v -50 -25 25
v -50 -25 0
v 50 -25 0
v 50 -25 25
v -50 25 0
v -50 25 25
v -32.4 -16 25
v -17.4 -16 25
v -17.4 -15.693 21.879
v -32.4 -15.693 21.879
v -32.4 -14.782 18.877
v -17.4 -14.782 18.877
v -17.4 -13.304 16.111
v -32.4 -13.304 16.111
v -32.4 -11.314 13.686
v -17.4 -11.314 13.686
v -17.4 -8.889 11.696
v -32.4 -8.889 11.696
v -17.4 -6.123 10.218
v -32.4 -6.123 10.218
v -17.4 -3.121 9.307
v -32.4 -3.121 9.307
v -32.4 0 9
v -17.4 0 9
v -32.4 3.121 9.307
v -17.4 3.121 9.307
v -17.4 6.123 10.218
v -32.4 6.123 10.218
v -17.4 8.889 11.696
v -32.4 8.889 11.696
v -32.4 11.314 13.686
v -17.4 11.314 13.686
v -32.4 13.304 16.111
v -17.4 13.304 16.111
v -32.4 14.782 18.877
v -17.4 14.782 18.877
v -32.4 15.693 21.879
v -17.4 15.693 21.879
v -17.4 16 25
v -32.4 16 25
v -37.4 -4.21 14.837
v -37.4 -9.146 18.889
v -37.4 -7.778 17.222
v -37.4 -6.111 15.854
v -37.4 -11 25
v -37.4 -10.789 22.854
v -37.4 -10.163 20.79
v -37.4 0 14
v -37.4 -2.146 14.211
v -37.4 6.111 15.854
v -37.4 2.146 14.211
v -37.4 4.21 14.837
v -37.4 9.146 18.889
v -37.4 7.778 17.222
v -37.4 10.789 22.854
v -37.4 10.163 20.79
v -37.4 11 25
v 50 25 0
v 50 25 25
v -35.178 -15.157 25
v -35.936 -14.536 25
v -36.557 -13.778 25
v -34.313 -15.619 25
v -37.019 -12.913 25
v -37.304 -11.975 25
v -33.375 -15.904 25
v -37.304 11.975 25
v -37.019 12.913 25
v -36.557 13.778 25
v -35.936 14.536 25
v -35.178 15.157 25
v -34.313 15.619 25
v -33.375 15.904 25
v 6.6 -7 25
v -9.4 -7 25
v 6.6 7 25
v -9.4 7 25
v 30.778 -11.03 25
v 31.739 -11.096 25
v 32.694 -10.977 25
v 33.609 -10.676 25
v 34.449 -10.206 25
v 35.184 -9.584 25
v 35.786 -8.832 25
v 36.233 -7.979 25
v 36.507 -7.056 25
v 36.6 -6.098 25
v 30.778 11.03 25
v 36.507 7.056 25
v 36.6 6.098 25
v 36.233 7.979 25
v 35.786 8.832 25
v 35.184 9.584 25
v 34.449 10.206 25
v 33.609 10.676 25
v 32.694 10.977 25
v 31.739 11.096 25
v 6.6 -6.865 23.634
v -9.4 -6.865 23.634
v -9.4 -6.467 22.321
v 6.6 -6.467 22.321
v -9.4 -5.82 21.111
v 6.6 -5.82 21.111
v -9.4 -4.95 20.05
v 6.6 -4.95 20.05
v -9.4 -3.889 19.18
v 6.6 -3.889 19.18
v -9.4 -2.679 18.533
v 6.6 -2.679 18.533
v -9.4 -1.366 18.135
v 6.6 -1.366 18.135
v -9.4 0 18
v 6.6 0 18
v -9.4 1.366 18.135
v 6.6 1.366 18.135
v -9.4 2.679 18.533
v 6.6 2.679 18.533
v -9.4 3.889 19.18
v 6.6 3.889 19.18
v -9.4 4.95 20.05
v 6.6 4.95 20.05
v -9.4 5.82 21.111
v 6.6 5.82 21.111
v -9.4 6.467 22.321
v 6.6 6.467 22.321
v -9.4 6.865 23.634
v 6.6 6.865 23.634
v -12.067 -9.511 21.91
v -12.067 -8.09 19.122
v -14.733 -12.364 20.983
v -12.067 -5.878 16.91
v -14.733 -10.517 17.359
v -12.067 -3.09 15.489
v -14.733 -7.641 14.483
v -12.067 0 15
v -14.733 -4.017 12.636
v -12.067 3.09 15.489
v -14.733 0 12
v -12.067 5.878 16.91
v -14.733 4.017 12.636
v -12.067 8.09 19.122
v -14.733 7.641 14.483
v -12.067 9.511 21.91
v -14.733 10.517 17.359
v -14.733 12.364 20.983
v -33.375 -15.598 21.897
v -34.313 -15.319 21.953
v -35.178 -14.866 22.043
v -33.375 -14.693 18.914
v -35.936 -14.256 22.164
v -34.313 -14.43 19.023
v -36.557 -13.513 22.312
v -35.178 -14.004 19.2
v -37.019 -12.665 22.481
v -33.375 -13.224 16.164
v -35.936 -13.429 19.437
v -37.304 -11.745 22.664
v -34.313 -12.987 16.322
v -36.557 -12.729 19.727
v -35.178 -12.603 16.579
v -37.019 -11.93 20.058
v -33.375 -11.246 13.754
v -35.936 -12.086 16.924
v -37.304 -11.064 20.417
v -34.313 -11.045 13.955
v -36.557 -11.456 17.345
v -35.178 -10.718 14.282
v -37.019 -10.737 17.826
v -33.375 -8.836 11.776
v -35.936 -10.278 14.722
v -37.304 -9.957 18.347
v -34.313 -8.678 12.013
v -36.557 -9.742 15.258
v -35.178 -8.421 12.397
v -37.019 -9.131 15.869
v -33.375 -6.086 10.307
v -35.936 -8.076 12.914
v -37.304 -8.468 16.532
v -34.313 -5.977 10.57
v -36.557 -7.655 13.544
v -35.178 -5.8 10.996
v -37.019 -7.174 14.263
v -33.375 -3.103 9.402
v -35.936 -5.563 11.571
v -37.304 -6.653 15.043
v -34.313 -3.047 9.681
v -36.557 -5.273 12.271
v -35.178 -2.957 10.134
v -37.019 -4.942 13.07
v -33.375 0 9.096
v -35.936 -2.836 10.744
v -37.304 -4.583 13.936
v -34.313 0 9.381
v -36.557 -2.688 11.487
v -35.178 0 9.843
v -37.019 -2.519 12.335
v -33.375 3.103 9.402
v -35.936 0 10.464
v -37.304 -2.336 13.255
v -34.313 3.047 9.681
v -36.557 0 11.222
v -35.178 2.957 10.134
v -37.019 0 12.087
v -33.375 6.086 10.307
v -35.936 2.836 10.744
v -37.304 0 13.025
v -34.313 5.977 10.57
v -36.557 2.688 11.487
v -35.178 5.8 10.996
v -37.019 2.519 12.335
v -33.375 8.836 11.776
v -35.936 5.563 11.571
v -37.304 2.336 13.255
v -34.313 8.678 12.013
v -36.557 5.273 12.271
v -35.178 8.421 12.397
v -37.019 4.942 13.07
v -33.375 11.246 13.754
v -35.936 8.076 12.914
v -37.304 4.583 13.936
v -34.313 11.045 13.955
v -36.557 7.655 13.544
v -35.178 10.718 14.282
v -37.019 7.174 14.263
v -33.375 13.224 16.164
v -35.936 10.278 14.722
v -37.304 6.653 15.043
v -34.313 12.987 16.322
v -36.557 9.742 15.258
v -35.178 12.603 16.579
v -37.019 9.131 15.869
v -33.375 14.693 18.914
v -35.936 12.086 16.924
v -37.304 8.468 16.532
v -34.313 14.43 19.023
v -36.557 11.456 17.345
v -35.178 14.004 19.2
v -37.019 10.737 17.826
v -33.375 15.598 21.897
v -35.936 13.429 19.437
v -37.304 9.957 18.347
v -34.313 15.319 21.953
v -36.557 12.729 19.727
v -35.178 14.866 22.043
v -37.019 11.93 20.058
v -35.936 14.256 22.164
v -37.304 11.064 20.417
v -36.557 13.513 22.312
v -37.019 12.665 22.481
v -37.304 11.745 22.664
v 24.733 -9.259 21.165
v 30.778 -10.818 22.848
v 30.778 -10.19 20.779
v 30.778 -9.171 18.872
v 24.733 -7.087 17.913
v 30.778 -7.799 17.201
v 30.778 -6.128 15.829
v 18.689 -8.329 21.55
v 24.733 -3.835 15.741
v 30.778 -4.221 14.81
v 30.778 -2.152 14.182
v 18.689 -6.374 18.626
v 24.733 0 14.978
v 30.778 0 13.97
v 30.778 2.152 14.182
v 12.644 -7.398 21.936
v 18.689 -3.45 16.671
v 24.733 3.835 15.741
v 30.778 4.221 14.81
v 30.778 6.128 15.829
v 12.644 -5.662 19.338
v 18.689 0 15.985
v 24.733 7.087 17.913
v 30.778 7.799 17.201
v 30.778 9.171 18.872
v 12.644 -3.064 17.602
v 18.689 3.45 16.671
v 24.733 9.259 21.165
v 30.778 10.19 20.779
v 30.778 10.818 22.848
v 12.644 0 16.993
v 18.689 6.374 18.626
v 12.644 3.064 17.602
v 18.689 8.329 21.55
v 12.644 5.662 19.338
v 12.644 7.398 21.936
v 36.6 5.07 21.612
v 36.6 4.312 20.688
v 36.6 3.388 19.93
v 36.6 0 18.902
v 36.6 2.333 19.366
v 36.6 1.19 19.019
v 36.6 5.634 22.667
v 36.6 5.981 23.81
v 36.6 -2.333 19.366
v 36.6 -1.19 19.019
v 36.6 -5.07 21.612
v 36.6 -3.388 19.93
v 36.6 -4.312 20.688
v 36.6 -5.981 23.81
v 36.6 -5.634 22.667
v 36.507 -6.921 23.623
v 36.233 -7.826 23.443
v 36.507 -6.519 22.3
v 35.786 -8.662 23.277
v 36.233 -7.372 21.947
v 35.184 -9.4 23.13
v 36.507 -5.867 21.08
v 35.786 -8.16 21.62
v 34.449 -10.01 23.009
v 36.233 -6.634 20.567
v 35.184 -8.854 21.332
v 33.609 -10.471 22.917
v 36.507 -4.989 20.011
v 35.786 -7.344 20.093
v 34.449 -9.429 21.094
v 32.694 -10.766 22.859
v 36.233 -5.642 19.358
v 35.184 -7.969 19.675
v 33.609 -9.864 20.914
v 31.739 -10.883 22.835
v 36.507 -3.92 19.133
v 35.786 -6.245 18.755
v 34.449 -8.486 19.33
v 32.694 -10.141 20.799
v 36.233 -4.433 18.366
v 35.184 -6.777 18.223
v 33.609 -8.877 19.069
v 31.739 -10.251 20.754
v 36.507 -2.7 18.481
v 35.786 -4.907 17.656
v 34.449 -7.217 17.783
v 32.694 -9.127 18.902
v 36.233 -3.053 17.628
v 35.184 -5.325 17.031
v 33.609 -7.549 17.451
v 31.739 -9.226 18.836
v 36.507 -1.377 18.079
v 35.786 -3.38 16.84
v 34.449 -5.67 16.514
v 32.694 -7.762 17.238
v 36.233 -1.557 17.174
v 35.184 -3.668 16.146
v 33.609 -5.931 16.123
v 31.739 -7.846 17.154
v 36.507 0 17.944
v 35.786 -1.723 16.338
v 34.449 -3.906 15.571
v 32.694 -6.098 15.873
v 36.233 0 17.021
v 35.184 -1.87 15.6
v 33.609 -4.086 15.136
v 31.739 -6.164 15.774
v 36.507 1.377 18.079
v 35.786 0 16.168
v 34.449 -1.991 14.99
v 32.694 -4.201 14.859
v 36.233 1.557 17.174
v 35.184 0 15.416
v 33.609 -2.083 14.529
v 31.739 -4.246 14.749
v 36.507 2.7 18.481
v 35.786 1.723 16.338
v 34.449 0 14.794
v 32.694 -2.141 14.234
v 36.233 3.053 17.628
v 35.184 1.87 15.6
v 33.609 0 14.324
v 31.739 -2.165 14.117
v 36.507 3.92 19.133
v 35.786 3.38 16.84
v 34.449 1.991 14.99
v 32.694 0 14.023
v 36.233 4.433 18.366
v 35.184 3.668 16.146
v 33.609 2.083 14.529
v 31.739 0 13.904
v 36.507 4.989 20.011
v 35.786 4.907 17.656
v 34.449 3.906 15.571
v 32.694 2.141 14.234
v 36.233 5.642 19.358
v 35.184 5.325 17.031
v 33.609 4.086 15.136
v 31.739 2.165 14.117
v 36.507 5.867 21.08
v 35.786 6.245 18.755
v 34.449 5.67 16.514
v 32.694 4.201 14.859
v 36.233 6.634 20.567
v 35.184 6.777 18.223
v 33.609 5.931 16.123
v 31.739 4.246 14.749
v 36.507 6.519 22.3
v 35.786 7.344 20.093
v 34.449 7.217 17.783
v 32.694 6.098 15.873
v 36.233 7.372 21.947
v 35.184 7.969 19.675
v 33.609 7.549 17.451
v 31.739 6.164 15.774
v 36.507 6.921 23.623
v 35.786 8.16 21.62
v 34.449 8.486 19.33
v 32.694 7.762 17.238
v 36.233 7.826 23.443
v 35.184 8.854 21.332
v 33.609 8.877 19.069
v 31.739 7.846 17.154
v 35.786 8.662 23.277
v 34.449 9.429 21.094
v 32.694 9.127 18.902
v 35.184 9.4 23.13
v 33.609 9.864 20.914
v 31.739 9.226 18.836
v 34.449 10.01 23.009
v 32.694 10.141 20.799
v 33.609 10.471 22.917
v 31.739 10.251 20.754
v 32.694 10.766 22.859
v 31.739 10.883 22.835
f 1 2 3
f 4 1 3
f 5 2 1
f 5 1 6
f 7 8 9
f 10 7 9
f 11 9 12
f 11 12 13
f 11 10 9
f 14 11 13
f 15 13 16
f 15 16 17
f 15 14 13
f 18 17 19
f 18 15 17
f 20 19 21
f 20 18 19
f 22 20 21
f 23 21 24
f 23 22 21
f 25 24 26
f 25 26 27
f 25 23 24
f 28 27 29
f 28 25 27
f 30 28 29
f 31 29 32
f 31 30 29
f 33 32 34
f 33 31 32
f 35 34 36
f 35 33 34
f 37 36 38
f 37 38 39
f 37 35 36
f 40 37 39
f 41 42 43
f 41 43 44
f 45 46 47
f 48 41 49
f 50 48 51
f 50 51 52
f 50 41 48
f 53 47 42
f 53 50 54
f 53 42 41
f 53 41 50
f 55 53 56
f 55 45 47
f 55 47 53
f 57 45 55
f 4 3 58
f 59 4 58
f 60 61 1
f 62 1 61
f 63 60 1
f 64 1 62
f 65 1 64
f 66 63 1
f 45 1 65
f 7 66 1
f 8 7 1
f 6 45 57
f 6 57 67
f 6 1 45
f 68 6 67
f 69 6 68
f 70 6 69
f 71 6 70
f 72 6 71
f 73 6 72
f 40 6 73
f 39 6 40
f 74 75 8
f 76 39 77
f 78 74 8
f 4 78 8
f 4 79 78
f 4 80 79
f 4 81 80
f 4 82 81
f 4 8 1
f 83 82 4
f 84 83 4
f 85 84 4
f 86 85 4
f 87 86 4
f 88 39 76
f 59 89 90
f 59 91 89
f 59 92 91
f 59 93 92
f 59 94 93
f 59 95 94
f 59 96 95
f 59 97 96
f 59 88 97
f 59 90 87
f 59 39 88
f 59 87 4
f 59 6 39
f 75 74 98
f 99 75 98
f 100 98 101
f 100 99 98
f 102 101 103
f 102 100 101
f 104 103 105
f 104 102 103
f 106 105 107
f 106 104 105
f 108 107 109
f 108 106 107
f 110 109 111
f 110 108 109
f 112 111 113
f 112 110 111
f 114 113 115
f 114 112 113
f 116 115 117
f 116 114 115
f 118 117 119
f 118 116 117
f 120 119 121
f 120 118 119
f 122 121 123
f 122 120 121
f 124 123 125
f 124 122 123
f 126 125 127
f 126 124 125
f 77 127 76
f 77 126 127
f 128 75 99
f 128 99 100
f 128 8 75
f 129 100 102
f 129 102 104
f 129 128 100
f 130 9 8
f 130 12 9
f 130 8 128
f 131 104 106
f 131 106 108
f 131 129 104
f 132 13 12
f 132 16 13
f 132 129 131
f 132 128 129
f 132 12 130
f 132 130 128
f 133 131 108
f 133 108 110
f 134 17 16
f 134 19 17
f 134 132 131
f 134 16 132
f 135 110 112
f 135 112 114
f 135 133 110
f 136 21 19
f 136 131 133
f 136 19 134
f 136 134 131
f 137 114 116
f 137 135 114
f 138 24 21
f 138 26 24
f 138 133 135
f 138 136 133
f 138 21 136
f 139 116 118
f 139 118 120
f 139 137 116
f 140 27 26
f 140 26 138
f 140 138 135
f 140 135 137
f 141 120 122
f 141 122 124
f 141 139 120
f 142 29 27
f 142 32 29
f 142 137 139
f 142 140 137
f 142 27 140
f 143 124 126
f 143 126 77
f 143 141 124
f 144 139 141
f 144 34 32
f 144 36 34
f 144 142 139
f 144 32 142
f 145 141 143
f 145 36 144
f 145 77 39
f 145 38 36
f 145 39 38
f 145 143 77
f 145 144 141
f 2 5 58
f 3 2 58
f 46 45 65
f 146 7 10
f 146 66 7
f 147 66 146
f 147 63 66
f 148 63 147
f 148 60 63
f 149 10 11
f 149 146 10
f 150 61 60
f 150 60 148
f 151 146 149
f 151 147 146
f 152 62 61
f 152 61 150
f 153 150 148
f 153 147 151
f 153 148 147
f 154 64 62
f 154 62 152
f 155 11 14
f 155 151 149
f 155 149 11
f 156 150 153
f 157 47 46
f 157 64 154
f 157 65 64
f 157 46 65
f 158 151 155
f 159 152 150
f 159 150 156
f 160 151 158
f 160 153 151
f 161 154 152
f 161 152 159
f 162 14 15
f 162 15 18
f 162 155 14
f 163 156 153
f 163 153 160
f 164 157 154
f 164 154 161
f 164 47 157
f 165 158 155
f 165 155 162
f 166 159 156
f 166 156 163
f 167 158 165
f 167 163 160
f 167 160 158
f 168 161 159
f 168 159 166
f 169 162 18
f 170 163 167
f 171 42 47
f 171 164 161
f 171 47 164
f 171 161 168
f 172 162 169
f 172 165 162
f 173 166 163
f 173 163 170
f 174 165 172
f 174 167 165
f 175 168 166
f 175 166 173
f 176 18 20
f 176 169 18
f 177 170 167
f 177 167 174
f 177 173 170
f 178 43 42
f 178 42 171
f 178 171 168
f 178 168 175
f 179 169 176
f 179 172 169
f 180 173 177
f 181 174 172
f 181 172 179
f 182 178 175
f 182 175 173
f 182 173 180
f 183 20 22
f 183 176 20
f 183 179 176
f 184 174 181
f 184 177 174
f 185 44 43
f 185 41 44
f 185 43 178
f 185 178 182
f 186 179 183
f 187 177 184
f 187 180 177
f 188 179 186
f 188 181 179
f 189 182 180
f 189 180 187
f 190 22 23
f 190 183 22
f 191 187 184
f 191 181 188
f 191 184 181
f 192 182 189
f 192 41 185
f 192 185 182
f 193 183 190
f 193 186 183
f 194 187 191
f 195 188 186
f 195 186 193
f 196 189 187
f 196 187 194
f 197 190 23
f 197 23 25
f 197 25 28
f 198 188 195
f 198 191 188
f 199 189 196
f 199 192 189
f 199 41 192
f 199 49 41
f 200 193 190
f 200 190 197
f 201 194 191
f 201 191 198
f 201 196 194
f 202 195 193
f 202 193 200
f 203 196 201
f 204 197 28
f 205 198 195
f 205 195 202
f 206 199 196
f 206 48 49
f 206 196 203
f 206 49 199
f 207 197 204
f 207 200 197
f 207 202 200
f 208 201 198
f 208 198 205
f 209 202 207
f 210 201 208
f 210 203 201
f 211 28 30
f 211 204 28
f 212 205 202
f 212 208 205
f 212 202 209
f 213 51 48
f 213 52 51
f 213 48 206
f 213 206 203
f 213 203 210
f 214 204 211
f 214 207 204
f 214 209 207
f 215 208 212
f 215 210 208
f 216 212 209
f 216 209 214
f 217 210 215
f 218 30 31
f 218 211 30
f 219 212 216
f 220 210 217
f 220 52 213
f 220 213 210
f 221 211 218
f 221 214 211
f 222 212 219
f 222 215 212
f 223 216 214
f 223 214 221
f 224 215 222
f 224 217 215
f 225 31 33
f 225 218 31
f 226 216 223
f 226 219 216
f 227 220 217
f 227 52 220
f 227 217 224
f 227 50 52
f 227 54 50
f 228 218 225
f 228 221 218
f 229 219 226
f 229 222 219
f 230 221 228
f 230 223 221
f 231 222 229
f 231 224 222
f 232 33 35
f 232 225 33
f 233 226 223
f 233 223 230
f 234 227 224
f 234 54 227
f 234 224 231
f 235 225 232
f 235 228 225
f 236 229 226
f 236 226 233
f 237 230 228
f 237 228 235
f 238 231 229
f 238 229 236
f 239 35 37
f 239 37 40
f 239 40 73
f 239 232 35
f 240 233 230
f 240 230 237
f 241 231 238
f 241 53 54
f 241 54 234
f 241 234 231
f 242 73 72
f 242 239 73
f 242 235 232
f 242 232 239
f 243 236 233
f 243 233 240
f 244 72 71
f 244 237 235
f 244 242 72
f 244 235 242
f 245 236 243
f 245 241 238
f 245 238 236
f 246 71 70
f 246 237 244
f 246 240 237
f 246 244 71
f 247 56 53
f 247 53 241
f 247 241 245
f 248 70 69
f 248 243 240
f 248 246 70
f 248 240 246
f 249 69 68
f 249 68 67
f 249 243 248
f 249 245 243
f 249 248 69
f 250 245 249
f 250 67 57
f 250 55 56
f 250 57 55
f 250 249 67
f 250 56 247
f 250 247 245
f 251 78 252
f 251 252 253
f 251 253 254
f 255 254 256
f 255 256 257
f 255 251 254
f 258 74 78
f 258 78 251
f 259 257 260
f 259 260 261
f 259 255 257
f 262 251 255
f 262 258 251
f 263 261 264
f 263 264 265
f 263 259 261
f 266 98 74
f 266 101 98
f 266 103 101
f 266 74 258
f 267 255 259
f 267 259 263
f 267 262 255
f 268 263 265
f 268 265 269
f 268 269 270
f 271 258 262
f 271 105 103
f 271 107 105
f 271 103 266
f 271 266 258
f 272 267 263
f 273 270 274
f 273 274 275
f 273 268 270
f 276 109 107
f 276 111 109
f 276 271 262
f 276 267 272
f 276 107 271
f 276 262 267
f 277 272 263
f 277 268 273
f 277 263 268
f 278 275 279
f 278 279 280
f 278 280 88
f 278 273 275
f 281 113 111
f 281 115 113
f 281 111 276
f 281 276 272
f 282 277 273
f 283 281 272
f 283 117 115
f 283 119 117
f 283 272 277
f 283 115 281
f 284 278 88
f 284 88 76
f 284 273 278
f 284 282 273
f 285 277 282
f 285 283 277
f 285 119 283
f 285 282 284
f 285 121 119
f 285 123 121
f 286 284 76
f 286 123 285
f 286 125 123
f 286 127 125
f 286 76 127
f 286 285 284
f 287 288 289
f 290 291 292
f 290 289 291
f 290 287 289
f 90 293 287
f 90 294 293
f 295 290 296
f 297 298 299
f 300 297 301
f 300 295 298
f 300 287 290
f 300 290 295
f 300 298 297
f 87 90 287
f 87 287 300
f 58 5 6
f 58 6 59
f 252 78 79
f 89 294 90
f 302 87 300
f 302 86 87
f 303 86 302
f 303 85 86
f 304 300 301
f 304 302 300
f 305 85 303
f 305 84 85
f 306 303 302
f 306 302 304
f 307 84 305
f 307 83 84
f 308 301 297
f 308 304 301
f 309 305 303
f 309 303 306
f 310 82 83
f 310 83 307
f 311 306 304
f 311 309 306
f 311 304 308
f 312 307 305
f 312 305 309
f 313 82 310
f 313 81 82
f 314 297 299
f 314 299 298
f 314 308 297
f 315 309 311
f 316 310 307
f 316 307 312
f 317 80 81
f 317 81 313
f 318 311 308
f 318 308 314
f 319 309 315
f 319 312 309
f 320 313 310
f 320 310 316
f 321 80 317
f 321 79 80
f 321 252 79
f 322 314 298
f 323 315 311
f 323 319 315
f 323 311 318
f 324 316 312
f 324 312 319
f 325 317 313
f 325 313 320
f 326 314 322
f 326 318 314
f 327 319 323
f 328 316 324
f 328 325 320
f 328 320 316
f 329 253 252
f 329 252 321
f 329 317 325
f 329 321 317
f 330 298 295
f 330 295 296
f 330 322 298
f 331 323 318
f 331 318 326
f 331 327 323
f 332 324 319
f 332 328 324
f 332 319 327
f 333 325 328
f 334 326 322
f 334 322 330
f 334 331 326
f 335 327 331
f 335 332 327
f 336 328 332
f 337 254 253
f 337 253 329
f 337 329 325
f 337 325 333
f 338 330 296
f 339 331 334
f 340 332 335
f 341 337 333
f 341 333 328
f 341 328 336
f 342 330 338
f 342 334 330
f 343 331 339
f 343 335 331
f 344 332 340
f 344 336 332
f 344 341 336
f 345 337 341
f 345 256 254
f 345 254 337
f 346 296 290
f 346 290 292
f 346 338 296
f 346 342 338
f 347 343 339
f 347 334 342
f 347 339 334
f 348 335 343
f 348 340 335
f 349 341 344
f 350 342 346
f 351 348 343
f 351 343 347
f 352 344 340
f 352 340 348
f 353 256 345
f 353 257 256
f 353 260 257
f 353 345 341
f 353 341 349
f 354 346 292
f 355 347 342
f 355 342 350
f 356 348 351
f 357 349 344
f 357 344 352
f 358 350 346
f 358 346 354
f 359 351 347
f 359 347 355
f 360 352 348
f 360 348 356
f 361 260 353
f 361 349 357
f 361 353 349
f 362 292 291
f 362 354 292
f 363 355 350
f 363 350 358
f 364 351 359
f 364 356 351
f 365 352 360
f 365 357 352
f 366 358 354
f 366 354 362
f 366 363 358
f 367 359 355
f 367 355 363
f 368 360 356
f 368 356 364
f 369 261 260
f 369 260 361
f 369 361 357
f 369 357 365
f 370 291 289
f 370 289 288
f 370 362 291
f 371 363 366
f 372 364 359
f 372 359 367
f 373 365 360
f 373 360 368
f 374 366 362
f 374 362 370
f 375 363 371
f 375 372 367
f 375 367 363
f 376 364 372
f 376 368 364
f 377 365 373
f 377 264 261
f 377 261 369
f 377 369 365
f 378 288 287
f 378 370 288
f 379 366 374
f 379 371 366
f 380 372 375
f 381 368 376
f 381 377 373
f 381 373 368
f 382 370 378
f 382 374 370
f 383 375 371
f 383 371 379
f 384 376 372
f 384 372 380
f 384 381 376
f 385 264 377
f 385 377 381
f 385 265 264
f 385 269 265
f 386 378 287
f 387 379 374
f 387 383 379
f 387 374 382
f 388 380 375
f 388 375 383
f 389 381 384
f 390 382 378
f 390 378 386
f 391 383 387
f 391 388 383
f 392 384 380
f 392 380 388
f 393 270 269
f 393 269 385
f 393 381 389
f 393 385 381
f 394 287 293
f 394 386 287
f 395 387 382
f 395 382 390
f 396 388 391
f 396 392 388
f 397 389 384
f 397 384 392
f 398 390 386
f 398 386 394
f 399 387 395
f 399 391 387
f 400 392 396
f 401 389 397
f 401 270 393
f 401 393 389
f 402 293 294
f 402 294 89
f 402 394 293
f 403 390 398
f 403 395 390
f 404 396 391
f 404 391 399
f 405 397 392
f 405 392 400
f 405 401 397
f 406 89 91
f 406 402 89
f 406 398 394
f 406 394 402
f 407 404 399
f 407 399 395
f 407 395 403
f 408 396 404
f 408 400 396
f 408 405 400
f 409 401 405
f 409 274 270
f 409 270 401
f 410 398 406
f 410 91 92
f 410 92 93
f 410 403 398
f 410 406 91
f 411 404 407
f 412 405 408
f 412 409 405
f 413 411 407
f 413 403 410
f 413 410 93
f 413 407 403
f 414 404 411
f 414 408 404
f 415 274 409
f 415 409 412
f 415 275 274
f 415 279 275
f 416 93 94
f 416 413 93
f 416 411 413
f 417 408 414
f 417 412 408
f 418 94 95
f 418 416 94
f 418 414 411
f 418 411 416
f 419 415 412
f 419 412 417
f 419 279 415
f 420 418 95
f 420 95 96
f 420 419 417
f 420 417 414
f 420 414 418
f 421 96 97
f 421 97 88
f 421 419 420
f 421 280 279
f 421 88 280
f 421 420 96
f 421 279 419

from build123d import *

# Parameters (mm, degrees)
F0_W     = 100
F0_H     = 50
F1_DEPTH = 25


with BuildPart() as f1:
    # F0 (on Top) → F1 (new body)
    with BuildSketch(Plane.XY):
        Rectangle(F0_W, F0_H)
    extrude(amount=F1_DEPTH)

    # F2 (on face) → F3 (revolve, cut)
    with BuildSketch(Plane.XY.offset(25)):
        with BuildLine():
            Line((-17.400011, 16), (-32.400011, 16))
            ThreePointArc((-32.400011, 16), (-35.935545, 14.535534), (-37.400011, 11))
            Line((-37.400011, 11), (-37.400011, 0))
            Line((-37.400011, 0), (36.599989, 0))
            Line((36.599989, 0), (36.599989, 6.097698))
            ThreePointArc((36.599989, 6.097698), (34.831864, 9.912798), (30.777994, 11.029668))
            Line((30.777994, 11.029668), (6.599989, 7))
            Line((6.599989, 7), (-9.400011, 7))
            Line((-9.400011, 7), (-17.400011, 16))
        make_face()
    revolve(axis=Axis((1.115499, 0, 25), (1, 0, 0)), mode=Mode.SUBTRACT)


solid = f1.part
